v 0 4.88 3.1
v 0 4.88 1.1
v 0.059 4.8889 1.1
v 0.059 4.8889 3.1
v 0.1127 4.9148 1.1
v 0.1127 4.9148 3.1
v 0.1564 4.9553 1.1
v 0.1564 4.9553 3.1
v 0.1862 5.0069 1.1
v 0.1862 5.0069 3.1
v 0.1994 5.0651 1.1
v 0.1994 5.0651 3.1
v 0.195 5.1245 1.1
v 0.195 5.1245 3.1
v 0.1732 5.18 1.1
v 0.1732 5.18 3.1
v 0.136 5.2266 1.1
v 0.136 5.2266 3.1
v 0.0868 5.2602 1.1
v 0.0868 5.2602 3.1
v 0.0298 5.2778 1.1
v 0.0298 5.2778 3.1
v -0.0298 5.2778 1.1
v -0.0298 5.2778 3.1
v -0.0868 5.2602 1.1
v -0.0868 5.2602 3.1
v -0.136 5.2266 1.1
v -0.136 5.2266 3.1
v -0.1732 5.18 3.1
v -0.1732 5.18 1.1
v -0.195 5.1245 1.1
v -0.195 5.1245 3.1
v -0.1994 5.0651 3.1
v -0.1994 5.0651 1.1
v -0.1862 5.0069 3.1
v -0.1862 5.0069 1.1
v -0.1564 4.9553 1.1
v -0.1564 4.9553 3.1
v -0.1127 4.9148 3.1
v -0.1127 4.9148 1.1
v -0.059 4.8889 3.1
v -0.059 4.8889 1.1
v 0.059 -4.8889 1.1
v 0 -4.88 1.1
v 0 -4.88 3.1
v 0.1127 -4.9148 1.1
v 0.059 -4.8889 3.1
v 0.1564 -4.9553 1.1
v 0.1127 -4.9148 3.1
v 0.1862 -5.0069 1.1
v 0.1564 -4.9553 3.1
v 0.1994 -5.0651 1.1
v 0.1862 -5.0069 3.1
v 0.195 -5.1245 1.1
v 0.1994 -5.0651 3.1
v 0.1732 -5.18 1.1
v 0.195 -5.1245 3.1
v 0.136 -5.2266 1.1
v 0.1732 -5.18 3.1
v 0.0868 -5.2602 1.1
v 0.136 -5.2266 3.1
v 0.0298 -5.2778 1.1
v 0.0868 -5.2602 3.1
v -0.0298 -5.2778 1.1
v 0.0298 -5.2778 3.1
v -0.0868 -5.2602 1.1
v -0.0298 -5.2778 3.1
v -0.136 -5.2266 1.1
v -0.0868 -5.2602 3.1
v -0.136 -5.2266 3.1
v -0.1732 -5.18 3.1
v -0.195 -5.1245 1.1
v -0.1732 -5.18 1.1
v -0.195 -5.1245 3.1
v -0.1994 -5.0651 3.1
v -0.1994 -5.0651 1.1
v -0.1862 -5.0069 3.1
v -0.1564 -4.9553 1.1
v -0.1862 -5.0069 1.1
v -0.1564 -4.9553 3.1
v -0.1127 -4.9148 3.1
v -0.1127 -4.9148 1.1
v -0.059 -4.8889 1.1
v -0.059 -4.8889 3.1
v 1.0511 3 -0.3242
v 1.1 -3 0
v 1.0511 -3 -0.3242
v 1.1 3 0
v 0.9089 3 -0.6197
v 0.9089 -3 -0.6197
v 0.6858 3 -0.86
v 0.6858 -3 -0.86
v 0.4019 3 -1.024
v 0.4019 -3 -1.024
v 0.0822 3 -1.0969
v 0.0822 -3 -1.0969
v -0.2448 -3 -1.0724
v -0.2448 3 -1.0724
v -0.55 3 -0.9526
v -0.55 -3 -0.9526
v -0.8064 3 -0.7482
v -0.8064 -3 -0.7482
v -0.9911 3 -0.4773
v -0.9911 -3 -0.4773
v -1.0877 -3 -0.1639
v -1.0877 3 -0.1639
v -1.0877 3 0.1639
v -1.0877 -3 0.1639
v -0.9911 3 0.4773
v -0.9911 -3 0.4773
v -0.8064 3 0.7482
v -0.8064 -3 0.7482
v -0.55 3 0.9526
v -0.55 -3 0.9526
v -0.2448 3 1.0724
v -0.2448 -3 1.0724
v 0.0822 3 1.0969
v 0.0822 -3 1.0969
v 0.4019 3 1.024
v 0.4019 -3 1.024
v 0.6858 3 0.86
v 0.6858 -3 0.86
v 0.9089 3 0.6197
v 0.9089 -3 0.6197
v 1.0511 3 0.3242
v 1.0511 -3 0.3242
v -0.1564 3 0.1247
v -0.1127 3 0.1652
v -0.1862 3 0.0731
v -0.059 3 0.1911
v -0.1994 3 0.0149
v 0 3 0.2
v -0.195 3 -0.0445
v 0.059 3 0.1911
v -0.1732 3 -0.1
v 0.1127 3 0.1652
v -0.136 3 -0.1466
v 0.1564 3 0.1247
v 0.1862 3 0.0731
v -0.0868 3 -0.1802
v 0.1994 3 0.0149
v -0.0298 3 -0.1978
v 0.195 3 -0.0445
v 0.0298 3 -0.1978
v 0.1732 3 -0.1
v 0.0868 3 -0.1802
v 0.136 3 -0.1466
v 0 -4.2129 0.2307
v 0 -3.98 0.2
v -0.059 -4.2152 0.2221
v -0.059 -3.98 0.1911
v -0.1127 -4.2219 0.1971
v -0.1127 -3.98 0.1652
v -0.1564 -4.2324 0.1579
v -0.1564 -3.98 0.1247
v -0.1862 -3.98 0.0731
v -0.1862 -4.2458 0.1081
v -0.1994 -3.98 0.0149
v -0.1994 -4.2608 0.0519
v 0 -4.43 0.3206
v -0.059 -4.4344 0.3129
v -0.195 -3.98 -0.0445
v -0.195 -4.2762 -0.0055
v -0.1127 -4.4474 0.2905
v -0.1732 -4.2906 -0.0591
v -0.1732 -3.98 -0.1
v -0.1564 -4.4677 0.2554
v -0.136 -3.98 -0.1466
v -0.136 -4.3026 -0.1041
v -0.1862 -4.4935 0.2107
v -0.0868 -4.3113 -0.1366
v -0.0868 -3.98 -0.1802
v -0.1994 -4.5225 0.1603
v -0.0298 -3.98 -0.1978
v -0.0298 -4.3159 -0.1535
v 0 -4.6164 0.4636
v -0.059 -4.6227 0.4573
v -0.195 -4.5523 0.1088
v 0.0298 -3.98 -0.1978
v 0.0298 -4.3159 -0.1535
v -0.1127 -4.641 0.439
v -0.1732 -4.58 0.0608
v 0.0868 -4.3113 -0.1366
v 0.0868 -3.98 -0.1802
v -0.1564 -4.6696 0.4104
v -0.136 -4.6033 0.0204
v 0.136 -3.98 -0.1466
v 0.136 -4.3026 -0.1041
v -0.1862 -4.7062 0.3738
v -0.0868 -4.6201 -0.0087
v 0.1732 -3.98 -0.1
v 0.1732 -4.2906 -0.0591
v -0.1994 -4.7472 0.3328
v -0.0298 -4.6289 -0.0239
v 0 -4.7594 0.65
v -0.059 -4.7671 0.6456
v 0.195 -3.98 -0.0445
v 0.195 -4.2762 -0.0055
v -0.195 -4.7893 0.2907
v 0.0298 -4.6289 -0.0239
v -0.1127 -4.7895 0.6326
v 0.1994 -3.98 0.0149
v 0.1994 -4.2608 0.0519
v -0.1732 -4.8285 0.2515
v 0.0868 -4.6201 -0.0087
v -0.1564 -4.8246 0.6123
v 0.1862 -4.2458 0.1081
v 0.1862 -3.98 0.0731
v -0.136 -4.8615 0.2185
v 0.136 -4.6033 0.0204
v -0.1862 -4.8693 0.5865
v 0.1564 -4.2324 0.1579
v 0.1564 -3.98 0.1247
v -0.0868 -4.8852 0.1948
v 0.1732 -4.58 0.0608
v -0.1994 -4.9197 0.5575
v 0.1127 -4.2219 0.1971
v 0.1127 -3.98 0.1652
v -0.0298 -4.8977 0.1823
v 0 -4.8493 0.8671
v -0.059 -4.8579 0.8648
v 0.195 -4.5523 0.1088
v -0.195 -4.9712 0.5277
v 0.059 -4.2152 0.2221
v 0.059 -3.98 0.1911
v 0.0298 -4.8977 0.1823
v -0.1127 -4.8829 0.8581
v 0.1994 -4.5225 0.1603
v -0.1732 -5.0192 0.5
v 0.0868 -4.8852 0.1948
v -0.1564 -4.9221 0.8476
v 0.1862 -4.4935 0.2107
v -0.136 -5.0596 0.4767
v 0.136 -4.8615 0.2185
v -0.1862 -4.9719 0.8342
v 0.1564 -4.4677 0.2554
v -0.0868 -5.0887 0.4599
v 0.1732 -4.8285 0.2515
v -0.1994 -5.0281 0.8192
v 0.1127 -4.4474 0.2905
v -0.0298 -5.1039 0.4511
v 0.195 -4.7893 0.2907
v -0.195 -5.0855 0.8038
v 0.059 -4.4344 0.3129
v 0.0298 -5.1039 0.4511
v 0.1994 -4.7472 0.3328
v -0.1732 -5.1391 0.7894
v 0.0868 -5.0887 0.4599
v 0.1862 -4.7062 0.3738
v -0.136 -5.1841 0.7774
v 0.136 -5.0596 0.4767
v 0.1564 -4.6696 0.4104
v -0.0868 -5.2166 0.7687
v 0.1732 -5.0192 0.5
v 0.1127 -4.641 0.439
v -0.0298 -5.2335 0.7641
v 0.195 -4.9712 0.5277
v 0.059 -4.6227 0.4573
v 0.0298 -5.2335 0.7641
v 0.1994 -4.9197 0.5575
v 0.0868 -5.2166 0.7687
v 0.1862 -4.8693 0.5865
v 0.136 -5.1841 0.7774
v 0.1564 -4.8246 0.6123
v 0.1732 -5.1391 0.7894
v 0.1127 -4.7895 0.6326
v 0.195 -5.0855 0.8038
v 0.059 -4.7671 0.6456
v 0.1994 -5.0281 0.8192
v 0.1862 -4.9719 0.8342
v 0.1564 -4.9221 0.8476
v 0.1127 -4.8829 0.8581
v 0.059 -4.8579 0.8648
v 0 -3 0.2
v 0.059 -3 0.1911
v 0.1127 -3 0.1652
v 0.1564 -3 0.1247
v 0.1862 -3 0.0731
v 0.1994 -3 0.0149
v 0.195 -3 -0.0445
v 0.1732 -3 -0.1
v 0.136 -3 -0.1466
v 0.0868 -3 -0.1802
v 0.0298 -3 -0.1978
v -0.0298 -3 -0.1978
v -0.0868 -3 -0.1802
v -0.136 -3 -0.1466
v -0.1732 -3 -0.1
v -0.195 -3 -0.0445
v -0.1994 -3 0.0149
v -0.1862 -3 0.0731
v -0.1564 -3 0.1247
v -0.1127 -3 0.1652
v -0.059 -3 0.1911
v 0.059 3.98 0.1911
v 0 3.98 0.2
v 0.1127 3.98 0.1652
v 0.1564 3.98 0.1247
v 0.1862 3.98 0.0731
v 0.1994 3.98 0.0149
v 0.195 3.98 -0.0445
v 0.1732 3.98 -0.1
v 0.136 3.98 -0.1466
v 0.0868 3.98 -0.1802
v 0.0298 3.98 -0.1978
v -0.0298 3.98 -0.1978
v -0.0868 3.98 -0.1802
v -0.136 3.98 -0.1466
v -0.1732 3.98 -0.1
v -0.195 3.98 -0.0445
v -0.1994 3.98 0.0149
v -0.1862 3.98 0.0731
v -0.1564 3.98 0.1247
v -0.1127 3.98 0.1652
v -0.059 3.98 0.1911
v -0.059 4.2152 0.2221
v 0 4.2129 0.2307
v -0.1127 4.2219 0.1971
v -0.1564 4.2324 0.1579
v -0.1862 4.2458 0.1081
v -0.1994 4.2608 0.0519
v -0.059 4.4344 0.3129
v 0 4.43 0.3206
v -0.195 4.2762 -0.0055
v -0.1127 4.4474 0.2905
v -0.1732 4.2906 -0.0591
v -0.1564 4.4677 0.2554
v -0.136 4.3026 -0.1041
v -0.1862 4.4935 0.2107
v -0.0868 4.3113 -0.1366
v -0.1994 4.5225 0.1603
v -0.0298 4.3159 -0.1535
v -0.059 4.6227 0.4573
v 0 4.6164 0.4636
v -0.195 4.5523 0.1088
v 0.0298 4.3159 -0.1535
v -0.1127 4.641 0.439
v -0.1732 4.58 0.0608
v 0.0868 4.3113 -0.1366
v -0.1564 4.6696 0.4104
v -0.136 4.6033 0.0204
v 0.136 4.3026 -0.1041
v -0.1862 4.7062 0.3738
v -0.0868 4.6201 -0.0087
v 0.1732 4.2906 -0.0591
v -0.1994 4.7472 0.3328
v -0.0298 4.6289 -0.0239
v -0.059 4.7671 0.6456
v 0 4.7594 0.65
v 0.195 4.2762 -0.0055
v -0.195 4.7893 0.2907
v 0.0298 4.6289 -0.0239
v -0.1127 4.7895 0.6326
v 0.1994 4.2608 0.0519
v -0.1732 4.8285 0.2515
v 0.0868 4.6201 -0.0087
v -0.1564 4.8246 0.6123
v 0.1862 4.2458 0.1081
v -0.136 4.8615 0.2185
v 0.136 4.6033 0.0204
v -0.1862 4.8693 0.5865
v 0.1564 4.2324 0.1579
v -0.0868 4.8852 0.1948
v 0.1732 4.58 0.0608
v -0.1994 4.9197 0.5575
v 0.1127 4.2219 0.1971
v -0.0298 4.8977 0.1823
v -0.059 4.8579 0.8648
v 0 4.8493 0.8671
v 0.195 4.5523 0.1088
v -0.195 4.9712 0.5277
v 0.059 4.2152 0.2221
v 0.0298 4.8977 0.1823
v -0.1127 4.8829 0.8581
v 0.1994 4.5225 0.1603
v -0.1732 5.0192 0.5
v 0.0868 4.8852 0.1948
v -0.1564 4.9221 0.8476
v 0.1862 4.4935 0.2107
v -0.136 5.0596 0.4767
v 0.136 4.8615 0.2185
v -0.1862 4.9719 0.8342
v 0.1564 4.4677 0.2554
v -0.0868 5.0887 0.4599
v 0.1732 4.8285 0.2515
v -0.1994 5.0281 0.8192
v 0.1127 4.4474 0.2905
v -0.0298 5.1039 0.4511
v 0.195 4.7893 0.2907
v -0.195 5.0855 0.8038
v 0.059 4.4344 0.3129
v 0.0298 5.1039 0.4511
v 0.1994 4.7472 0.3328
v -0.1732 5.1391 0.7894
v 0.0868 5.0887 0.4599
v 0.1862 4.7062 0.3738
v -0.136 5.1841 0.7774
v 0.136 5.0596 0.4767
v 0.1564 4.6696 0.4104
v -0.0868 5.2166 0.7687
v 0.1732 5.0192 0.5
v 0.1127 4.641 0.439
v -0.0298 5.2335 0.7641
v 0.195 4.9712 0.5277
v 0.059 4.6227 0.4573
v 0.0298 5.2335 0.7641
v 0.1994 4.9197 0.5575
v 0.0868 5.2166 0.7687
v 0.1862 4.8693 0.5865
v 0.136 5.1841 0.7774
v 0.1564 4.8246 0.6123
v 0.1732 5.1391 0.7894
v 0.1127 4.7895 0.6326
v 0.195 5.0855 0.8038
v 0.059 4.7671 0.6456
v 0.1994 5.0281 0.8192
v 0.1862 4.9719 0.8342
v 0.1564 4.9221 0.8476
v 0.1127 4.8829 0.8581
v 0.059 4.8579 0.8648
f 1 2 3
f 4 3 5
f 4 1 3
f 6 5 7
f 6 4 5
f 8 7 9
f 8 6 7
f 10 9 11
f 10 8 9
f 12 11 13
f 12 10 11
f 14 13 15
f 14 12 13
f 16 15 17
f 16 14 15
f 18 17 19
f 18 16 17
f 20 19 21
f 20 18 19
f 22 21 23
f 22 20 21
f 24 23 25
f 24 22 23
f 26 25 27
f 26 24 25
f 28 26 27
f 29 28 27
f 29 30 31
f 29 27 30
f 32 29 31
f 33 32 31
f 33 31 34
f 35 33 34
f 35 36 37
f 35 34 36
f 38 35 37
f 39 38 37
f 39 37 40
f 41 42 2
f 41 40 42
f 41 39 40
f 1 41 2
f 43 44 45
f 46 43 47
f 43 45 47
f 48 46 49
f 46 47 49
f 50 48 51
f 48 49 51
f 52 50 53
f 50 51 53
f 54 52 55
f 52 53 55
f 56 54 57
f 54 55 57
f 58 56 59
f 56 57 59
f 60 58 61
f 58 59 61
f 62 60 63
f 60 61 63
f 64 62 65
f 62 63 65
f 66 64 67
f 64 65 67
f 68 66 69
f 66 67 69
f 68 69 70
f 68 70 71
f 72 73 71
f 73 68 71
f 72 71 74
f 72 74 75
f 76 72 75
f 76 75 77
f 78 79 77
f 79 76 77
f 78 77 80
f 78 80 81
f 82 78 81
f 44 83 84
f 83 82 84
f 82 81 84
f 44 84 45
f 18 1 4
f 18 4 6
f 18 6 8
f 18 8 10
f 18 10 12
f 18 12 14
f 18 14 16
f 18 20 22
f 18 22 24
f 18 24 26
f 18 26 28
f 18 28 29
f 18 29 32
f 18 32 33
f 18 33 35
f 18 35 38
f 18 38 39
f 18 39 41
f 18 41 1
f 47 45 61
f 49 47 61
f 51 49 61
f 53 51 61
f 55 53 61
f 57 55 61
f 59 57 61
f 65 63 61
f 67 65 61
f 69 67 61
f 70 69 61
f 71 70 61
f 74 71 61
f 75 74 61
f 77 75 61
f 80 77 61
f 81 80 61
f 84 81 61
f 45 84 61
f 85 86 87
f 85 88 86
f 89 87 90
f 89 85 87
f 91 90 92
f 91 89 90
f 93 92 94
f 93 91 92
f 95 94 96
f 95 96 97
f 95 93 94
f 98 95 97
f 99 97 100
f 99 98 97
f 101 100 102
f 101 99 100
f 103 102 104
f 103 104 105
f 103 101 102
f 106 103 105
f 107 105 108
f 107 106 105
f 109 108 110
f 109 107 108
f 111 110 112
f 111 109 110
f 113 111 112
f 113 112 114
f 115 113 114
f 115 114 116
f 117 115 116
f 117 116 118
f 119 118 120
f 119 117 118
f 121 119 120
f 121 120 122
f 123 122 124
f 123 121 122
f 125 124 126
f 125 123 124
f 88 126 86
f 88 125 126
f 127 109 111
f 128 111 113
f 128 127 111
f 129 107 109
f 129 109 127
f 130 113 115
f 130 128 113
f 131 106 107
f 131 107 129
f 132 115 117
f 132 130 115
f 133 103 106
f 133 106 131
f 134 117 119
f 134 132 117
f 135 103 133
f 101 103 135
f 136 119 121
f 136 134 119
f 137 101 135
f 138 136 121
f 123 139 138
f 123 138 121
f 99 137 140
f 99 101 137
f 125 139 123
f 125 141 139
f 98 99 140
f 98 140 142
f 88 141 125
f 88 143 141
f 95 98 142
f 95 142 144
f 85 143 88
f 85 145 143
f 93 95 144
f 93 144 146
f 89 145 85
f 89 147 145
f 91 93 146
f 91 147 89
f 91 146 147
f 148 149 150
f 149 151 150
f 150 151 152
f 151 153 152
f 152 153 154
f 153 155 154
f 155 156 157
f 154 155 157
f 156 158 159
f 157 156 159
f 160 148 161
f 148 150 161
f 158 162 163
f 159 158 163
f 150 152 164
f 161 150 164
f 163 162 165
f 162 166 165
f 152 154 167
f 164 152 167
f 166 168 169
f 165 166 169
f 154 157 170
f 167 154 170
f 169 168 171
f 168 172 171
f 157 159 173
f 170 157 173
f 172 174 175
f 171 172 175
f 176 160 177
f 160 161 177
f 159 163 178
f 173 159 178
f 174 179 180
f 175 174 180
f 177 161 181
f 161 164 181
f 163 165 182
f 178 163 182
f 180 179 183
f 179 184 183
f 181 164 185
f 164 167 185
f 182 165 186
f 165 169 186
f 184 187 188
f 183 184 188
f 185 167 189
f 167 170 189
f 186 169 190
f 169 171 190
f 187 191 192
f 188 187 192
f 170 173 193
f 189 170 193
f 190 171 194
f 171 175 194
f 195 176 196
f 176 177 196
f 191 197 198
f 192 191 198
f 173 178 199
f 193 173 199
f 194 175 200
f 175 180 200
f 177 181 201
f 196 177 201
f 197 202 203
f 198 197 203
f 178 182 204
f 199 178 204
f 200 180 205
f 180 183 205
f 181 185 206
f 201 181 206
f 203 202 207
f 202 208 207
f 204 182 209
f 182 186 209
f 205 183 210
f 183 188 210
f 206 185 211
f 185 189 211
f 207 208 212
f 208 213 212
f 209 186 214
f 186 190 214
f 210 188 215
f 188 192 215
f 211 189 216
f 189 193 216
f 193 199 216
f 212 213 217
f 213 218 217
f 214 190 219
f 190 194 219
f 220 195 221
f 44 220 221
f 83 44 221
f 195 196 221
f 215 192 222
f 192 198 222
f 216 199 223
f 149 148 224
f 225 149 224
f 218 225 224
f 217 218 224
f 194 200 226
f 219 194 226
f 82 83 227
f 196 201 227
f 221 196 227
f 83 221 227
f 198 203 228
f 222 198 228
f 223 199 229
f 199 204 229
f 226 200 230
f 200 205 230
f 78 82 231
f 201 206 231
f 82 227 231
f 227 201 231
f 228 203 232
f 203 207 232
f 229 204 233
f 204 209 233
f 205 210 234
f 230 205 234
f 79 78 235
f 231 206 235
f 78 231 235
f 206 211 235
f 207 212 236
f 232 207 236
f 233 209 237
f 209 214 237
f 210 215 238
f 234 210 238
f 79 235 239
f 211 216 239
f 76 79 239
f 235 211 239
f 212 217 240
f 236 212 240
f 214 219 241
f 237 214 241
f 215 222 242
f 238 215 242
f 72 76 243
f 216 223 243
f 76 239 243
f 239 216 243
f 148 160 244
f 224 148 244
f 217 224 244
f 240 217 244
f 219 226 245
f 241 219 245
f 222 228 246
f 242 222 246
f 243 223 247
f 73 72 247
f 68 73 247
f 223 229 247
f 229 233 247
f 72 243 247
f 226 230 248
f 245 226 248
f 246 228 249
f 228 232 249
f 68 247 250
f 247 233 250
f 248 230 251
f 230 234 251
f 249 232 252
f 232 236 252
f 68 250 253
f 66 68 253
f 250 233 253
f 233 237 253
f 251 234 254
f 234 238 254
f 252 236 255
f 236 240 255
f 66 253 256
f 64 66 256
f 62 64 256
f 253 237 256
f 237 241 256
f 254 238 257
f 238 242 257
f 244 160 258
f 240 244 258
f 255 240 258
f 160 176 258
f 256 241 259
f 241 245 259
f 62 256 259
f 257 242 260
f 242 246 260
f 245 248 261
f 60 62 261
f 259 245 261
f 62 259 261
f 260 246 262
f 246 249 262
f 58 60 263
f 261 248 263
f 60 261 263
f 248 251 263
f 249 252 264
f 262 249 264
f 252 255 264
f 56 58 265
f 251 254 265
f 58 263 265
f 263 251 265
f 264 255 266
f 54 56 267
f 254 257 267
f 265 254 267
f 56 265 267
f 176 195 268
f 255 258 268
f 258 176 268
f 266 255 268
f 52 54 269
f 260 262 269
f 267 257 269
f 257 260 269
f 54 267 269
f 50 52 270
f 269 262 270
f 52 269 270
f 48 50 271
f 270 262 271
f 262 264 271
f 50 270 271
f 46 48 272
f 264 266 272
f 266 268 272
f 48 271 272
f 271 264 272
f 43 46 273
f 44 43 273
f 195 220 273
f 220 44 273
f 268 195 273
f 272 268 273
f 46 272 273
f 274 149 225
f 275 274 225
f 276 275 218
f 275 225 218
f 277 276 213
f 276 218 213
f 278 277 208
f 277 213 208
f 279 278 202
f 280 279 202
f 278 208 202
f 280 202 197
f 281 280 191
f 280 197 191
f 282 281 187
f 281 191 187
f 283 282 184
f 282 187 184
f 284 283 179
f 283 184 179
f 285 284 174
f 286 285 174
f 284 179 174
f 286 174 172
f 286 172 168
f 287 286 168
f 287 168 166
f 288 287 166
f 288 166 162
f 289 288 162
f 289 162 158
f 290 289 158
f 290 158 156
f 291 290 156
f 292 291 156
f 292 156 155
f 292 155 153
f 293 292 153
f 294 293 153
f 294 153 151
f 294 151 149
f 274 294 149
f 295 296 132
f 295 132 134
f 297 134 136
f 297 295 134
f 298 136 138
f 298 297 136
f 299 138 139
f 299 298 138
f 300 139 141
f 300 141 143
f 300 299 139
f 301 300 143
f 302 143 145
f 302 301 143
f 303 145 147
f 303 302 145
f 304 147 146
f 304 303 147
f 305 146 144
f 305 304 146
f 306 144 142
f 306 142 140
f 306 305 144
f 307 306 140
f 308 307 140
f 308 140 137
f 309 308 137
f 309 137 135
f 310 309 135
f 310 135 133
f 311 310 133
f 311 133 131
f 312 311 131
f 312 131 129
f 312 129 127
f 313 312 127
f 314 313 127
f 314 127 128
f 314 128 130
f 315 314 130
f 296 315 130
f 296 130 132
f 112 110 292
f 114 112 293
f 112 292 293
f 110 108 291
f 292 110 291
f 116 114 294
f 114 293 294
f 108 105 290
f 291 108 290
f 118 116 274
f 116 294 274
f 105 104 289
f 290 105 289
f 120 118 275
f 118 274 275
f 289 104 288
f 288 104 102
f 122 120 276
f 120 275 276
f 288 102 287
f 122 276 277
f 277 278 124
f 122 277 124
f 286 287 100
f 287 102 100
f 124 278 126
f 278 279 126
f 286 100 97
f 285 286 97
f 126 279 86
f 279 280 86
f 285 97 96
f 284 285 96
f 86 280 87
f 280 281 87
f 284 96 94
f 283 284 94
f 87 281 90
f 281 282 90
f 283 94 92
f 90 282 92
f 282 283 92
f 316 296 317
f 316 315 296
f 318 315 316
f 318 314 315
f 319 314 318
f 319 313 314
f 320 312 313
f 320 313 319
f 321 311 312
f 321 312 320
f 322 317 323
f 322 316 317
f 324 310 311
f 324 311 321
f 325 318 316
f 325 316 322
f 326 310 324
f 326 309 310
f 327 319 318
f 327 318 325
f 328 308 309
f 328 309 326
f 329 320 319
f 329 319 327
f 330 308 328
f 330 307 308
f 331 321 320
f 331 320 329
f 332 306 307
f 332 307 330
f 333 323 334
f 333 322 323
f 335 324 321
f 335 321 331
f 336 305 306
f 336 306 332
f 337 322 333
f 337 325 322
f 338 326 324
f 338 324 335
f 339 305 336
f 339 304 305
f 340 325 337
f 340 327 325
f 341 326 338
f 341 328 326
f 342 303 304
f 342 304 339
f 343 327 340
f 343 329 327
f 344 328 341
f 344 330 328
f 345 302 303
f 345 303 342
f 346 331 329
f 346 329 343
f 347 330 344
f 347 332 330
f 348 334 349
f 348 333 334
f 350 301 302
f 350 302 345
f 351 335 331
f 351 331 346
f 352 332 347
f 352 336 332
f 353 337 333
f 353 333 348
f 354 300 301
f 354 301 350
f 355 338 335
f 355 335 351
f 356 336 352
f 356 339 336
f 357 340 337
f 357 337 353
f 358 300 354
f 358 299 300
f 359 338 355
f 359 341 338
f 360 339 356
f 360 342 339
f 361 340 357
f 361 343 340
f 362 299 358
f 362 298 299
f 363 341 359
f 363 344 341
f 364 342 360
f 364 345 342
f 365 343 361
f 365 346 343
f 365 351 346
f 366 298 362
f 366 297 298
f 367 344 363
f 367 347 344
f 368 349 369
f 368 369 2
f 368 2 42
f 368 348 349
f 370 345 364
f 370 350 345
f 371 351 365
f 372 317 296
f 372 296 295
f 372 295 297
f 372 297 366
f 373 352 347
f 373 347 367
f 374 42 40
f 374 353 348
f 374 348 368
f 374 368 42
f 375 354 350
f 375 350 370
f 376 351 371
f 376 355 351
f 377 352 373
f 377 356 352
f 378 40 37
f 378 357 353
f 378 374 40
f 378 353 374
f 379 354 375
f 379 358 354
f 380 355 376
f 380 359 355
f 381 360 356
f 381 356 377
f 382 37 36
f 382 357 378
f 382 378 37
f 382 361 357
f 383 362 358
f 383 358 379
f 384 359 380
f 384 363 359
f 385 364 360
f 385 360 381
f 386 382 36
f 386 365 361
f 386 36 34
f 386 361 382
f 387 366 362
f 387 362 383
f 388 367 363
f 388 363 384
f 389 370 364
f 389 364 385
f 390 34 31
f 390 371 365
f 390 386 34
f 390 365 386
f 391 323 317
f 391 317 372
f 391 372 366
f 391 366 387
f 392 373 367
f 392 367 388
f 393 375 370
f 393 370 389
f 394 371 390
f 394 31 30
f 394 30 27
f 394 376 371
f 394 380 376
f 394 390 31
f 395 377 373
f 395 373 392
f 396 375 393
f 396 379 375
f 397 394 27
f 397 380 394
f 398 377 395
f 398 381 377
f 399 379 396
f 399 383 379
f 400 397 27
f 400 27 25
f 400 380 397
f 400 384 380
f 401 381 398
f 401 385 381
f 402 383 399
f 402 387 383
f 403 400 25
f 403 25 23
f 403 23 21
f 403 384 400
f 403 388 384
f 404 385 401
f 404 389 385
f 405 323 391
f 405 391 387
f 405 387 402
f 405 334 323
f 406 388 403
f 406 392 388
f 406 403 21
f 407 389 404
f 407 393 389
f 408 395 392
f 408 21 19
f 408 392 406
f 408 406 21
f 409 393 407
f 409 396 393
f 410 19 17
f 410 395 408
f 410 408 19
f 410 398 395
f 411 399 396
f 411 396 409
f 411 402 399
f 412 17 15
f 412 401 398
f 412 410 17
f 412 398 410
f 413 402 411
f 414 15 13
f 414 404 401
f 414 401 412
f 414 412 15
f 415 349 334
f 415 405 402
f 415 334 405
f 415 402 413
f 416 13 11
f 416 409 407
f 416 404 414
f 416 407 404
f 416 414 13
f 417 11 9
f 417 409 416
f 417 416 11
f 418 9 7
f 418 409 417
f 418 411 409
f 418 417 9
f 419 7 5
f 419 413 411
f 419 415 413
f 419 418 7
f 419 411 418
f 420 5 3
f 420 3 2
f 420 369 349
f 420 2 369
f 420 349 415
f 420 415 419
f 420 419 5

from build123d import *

# Parameters (mm, degrees)
BOSS_EXTRUDE1_DEPTH      = 3
BOSS_EXTRUDE1_DEPTH_BACK = 3
SKETCH2_R                = 1.1
SWEEP1_PROFILE_R         = 0.2


with BuildPart() as part:
    # Sketch2 → Boss-Extrude1 (new, two sides: drawn at the far end of the back side and taken through both)
    with BuildSketch(Plane(origin=(0, 0, 0), x_dir=(1, 0, 0), z_dir=(0, 1, 0)).offset(-BOSS_EXTRUDE1_DEPTH_BACK)):
        Circle(SKETCH2_R)
    extrude(amount=BOSS_EXTRUDE1_DEPTH + BOSS_EXTRUDE1_DEPTH_BACK)

    # Sweep1: sweep along a path in Sketch3
    with BuildLine(Plane(origin=(0, 0, 0), x_dir=(0, 0, -1), z_dir=(1, 0, 0))) as sweep1_path:
        Line((0, 3), (0, 3.98))
        ThreePointArc((0, 3.98), (-0.322182541, 4.757817459), (-1.1, 5.08))
        Line((-1.1, 5.08), (-3.1, 5.08))
    # Sweep1 profile (on start of the path) → Sweep1 (sweep)
    with BuildSketch(Plane.ZX.offset(3)):
        Circle(SWEEP1_PROFILE_R)
    sweep1 = sweep(path=sweep1_path.line)

    # Mirror1: Sweep1 across plane
    add(sweep1.mirror(Plane.ZX))


solid = part.part
